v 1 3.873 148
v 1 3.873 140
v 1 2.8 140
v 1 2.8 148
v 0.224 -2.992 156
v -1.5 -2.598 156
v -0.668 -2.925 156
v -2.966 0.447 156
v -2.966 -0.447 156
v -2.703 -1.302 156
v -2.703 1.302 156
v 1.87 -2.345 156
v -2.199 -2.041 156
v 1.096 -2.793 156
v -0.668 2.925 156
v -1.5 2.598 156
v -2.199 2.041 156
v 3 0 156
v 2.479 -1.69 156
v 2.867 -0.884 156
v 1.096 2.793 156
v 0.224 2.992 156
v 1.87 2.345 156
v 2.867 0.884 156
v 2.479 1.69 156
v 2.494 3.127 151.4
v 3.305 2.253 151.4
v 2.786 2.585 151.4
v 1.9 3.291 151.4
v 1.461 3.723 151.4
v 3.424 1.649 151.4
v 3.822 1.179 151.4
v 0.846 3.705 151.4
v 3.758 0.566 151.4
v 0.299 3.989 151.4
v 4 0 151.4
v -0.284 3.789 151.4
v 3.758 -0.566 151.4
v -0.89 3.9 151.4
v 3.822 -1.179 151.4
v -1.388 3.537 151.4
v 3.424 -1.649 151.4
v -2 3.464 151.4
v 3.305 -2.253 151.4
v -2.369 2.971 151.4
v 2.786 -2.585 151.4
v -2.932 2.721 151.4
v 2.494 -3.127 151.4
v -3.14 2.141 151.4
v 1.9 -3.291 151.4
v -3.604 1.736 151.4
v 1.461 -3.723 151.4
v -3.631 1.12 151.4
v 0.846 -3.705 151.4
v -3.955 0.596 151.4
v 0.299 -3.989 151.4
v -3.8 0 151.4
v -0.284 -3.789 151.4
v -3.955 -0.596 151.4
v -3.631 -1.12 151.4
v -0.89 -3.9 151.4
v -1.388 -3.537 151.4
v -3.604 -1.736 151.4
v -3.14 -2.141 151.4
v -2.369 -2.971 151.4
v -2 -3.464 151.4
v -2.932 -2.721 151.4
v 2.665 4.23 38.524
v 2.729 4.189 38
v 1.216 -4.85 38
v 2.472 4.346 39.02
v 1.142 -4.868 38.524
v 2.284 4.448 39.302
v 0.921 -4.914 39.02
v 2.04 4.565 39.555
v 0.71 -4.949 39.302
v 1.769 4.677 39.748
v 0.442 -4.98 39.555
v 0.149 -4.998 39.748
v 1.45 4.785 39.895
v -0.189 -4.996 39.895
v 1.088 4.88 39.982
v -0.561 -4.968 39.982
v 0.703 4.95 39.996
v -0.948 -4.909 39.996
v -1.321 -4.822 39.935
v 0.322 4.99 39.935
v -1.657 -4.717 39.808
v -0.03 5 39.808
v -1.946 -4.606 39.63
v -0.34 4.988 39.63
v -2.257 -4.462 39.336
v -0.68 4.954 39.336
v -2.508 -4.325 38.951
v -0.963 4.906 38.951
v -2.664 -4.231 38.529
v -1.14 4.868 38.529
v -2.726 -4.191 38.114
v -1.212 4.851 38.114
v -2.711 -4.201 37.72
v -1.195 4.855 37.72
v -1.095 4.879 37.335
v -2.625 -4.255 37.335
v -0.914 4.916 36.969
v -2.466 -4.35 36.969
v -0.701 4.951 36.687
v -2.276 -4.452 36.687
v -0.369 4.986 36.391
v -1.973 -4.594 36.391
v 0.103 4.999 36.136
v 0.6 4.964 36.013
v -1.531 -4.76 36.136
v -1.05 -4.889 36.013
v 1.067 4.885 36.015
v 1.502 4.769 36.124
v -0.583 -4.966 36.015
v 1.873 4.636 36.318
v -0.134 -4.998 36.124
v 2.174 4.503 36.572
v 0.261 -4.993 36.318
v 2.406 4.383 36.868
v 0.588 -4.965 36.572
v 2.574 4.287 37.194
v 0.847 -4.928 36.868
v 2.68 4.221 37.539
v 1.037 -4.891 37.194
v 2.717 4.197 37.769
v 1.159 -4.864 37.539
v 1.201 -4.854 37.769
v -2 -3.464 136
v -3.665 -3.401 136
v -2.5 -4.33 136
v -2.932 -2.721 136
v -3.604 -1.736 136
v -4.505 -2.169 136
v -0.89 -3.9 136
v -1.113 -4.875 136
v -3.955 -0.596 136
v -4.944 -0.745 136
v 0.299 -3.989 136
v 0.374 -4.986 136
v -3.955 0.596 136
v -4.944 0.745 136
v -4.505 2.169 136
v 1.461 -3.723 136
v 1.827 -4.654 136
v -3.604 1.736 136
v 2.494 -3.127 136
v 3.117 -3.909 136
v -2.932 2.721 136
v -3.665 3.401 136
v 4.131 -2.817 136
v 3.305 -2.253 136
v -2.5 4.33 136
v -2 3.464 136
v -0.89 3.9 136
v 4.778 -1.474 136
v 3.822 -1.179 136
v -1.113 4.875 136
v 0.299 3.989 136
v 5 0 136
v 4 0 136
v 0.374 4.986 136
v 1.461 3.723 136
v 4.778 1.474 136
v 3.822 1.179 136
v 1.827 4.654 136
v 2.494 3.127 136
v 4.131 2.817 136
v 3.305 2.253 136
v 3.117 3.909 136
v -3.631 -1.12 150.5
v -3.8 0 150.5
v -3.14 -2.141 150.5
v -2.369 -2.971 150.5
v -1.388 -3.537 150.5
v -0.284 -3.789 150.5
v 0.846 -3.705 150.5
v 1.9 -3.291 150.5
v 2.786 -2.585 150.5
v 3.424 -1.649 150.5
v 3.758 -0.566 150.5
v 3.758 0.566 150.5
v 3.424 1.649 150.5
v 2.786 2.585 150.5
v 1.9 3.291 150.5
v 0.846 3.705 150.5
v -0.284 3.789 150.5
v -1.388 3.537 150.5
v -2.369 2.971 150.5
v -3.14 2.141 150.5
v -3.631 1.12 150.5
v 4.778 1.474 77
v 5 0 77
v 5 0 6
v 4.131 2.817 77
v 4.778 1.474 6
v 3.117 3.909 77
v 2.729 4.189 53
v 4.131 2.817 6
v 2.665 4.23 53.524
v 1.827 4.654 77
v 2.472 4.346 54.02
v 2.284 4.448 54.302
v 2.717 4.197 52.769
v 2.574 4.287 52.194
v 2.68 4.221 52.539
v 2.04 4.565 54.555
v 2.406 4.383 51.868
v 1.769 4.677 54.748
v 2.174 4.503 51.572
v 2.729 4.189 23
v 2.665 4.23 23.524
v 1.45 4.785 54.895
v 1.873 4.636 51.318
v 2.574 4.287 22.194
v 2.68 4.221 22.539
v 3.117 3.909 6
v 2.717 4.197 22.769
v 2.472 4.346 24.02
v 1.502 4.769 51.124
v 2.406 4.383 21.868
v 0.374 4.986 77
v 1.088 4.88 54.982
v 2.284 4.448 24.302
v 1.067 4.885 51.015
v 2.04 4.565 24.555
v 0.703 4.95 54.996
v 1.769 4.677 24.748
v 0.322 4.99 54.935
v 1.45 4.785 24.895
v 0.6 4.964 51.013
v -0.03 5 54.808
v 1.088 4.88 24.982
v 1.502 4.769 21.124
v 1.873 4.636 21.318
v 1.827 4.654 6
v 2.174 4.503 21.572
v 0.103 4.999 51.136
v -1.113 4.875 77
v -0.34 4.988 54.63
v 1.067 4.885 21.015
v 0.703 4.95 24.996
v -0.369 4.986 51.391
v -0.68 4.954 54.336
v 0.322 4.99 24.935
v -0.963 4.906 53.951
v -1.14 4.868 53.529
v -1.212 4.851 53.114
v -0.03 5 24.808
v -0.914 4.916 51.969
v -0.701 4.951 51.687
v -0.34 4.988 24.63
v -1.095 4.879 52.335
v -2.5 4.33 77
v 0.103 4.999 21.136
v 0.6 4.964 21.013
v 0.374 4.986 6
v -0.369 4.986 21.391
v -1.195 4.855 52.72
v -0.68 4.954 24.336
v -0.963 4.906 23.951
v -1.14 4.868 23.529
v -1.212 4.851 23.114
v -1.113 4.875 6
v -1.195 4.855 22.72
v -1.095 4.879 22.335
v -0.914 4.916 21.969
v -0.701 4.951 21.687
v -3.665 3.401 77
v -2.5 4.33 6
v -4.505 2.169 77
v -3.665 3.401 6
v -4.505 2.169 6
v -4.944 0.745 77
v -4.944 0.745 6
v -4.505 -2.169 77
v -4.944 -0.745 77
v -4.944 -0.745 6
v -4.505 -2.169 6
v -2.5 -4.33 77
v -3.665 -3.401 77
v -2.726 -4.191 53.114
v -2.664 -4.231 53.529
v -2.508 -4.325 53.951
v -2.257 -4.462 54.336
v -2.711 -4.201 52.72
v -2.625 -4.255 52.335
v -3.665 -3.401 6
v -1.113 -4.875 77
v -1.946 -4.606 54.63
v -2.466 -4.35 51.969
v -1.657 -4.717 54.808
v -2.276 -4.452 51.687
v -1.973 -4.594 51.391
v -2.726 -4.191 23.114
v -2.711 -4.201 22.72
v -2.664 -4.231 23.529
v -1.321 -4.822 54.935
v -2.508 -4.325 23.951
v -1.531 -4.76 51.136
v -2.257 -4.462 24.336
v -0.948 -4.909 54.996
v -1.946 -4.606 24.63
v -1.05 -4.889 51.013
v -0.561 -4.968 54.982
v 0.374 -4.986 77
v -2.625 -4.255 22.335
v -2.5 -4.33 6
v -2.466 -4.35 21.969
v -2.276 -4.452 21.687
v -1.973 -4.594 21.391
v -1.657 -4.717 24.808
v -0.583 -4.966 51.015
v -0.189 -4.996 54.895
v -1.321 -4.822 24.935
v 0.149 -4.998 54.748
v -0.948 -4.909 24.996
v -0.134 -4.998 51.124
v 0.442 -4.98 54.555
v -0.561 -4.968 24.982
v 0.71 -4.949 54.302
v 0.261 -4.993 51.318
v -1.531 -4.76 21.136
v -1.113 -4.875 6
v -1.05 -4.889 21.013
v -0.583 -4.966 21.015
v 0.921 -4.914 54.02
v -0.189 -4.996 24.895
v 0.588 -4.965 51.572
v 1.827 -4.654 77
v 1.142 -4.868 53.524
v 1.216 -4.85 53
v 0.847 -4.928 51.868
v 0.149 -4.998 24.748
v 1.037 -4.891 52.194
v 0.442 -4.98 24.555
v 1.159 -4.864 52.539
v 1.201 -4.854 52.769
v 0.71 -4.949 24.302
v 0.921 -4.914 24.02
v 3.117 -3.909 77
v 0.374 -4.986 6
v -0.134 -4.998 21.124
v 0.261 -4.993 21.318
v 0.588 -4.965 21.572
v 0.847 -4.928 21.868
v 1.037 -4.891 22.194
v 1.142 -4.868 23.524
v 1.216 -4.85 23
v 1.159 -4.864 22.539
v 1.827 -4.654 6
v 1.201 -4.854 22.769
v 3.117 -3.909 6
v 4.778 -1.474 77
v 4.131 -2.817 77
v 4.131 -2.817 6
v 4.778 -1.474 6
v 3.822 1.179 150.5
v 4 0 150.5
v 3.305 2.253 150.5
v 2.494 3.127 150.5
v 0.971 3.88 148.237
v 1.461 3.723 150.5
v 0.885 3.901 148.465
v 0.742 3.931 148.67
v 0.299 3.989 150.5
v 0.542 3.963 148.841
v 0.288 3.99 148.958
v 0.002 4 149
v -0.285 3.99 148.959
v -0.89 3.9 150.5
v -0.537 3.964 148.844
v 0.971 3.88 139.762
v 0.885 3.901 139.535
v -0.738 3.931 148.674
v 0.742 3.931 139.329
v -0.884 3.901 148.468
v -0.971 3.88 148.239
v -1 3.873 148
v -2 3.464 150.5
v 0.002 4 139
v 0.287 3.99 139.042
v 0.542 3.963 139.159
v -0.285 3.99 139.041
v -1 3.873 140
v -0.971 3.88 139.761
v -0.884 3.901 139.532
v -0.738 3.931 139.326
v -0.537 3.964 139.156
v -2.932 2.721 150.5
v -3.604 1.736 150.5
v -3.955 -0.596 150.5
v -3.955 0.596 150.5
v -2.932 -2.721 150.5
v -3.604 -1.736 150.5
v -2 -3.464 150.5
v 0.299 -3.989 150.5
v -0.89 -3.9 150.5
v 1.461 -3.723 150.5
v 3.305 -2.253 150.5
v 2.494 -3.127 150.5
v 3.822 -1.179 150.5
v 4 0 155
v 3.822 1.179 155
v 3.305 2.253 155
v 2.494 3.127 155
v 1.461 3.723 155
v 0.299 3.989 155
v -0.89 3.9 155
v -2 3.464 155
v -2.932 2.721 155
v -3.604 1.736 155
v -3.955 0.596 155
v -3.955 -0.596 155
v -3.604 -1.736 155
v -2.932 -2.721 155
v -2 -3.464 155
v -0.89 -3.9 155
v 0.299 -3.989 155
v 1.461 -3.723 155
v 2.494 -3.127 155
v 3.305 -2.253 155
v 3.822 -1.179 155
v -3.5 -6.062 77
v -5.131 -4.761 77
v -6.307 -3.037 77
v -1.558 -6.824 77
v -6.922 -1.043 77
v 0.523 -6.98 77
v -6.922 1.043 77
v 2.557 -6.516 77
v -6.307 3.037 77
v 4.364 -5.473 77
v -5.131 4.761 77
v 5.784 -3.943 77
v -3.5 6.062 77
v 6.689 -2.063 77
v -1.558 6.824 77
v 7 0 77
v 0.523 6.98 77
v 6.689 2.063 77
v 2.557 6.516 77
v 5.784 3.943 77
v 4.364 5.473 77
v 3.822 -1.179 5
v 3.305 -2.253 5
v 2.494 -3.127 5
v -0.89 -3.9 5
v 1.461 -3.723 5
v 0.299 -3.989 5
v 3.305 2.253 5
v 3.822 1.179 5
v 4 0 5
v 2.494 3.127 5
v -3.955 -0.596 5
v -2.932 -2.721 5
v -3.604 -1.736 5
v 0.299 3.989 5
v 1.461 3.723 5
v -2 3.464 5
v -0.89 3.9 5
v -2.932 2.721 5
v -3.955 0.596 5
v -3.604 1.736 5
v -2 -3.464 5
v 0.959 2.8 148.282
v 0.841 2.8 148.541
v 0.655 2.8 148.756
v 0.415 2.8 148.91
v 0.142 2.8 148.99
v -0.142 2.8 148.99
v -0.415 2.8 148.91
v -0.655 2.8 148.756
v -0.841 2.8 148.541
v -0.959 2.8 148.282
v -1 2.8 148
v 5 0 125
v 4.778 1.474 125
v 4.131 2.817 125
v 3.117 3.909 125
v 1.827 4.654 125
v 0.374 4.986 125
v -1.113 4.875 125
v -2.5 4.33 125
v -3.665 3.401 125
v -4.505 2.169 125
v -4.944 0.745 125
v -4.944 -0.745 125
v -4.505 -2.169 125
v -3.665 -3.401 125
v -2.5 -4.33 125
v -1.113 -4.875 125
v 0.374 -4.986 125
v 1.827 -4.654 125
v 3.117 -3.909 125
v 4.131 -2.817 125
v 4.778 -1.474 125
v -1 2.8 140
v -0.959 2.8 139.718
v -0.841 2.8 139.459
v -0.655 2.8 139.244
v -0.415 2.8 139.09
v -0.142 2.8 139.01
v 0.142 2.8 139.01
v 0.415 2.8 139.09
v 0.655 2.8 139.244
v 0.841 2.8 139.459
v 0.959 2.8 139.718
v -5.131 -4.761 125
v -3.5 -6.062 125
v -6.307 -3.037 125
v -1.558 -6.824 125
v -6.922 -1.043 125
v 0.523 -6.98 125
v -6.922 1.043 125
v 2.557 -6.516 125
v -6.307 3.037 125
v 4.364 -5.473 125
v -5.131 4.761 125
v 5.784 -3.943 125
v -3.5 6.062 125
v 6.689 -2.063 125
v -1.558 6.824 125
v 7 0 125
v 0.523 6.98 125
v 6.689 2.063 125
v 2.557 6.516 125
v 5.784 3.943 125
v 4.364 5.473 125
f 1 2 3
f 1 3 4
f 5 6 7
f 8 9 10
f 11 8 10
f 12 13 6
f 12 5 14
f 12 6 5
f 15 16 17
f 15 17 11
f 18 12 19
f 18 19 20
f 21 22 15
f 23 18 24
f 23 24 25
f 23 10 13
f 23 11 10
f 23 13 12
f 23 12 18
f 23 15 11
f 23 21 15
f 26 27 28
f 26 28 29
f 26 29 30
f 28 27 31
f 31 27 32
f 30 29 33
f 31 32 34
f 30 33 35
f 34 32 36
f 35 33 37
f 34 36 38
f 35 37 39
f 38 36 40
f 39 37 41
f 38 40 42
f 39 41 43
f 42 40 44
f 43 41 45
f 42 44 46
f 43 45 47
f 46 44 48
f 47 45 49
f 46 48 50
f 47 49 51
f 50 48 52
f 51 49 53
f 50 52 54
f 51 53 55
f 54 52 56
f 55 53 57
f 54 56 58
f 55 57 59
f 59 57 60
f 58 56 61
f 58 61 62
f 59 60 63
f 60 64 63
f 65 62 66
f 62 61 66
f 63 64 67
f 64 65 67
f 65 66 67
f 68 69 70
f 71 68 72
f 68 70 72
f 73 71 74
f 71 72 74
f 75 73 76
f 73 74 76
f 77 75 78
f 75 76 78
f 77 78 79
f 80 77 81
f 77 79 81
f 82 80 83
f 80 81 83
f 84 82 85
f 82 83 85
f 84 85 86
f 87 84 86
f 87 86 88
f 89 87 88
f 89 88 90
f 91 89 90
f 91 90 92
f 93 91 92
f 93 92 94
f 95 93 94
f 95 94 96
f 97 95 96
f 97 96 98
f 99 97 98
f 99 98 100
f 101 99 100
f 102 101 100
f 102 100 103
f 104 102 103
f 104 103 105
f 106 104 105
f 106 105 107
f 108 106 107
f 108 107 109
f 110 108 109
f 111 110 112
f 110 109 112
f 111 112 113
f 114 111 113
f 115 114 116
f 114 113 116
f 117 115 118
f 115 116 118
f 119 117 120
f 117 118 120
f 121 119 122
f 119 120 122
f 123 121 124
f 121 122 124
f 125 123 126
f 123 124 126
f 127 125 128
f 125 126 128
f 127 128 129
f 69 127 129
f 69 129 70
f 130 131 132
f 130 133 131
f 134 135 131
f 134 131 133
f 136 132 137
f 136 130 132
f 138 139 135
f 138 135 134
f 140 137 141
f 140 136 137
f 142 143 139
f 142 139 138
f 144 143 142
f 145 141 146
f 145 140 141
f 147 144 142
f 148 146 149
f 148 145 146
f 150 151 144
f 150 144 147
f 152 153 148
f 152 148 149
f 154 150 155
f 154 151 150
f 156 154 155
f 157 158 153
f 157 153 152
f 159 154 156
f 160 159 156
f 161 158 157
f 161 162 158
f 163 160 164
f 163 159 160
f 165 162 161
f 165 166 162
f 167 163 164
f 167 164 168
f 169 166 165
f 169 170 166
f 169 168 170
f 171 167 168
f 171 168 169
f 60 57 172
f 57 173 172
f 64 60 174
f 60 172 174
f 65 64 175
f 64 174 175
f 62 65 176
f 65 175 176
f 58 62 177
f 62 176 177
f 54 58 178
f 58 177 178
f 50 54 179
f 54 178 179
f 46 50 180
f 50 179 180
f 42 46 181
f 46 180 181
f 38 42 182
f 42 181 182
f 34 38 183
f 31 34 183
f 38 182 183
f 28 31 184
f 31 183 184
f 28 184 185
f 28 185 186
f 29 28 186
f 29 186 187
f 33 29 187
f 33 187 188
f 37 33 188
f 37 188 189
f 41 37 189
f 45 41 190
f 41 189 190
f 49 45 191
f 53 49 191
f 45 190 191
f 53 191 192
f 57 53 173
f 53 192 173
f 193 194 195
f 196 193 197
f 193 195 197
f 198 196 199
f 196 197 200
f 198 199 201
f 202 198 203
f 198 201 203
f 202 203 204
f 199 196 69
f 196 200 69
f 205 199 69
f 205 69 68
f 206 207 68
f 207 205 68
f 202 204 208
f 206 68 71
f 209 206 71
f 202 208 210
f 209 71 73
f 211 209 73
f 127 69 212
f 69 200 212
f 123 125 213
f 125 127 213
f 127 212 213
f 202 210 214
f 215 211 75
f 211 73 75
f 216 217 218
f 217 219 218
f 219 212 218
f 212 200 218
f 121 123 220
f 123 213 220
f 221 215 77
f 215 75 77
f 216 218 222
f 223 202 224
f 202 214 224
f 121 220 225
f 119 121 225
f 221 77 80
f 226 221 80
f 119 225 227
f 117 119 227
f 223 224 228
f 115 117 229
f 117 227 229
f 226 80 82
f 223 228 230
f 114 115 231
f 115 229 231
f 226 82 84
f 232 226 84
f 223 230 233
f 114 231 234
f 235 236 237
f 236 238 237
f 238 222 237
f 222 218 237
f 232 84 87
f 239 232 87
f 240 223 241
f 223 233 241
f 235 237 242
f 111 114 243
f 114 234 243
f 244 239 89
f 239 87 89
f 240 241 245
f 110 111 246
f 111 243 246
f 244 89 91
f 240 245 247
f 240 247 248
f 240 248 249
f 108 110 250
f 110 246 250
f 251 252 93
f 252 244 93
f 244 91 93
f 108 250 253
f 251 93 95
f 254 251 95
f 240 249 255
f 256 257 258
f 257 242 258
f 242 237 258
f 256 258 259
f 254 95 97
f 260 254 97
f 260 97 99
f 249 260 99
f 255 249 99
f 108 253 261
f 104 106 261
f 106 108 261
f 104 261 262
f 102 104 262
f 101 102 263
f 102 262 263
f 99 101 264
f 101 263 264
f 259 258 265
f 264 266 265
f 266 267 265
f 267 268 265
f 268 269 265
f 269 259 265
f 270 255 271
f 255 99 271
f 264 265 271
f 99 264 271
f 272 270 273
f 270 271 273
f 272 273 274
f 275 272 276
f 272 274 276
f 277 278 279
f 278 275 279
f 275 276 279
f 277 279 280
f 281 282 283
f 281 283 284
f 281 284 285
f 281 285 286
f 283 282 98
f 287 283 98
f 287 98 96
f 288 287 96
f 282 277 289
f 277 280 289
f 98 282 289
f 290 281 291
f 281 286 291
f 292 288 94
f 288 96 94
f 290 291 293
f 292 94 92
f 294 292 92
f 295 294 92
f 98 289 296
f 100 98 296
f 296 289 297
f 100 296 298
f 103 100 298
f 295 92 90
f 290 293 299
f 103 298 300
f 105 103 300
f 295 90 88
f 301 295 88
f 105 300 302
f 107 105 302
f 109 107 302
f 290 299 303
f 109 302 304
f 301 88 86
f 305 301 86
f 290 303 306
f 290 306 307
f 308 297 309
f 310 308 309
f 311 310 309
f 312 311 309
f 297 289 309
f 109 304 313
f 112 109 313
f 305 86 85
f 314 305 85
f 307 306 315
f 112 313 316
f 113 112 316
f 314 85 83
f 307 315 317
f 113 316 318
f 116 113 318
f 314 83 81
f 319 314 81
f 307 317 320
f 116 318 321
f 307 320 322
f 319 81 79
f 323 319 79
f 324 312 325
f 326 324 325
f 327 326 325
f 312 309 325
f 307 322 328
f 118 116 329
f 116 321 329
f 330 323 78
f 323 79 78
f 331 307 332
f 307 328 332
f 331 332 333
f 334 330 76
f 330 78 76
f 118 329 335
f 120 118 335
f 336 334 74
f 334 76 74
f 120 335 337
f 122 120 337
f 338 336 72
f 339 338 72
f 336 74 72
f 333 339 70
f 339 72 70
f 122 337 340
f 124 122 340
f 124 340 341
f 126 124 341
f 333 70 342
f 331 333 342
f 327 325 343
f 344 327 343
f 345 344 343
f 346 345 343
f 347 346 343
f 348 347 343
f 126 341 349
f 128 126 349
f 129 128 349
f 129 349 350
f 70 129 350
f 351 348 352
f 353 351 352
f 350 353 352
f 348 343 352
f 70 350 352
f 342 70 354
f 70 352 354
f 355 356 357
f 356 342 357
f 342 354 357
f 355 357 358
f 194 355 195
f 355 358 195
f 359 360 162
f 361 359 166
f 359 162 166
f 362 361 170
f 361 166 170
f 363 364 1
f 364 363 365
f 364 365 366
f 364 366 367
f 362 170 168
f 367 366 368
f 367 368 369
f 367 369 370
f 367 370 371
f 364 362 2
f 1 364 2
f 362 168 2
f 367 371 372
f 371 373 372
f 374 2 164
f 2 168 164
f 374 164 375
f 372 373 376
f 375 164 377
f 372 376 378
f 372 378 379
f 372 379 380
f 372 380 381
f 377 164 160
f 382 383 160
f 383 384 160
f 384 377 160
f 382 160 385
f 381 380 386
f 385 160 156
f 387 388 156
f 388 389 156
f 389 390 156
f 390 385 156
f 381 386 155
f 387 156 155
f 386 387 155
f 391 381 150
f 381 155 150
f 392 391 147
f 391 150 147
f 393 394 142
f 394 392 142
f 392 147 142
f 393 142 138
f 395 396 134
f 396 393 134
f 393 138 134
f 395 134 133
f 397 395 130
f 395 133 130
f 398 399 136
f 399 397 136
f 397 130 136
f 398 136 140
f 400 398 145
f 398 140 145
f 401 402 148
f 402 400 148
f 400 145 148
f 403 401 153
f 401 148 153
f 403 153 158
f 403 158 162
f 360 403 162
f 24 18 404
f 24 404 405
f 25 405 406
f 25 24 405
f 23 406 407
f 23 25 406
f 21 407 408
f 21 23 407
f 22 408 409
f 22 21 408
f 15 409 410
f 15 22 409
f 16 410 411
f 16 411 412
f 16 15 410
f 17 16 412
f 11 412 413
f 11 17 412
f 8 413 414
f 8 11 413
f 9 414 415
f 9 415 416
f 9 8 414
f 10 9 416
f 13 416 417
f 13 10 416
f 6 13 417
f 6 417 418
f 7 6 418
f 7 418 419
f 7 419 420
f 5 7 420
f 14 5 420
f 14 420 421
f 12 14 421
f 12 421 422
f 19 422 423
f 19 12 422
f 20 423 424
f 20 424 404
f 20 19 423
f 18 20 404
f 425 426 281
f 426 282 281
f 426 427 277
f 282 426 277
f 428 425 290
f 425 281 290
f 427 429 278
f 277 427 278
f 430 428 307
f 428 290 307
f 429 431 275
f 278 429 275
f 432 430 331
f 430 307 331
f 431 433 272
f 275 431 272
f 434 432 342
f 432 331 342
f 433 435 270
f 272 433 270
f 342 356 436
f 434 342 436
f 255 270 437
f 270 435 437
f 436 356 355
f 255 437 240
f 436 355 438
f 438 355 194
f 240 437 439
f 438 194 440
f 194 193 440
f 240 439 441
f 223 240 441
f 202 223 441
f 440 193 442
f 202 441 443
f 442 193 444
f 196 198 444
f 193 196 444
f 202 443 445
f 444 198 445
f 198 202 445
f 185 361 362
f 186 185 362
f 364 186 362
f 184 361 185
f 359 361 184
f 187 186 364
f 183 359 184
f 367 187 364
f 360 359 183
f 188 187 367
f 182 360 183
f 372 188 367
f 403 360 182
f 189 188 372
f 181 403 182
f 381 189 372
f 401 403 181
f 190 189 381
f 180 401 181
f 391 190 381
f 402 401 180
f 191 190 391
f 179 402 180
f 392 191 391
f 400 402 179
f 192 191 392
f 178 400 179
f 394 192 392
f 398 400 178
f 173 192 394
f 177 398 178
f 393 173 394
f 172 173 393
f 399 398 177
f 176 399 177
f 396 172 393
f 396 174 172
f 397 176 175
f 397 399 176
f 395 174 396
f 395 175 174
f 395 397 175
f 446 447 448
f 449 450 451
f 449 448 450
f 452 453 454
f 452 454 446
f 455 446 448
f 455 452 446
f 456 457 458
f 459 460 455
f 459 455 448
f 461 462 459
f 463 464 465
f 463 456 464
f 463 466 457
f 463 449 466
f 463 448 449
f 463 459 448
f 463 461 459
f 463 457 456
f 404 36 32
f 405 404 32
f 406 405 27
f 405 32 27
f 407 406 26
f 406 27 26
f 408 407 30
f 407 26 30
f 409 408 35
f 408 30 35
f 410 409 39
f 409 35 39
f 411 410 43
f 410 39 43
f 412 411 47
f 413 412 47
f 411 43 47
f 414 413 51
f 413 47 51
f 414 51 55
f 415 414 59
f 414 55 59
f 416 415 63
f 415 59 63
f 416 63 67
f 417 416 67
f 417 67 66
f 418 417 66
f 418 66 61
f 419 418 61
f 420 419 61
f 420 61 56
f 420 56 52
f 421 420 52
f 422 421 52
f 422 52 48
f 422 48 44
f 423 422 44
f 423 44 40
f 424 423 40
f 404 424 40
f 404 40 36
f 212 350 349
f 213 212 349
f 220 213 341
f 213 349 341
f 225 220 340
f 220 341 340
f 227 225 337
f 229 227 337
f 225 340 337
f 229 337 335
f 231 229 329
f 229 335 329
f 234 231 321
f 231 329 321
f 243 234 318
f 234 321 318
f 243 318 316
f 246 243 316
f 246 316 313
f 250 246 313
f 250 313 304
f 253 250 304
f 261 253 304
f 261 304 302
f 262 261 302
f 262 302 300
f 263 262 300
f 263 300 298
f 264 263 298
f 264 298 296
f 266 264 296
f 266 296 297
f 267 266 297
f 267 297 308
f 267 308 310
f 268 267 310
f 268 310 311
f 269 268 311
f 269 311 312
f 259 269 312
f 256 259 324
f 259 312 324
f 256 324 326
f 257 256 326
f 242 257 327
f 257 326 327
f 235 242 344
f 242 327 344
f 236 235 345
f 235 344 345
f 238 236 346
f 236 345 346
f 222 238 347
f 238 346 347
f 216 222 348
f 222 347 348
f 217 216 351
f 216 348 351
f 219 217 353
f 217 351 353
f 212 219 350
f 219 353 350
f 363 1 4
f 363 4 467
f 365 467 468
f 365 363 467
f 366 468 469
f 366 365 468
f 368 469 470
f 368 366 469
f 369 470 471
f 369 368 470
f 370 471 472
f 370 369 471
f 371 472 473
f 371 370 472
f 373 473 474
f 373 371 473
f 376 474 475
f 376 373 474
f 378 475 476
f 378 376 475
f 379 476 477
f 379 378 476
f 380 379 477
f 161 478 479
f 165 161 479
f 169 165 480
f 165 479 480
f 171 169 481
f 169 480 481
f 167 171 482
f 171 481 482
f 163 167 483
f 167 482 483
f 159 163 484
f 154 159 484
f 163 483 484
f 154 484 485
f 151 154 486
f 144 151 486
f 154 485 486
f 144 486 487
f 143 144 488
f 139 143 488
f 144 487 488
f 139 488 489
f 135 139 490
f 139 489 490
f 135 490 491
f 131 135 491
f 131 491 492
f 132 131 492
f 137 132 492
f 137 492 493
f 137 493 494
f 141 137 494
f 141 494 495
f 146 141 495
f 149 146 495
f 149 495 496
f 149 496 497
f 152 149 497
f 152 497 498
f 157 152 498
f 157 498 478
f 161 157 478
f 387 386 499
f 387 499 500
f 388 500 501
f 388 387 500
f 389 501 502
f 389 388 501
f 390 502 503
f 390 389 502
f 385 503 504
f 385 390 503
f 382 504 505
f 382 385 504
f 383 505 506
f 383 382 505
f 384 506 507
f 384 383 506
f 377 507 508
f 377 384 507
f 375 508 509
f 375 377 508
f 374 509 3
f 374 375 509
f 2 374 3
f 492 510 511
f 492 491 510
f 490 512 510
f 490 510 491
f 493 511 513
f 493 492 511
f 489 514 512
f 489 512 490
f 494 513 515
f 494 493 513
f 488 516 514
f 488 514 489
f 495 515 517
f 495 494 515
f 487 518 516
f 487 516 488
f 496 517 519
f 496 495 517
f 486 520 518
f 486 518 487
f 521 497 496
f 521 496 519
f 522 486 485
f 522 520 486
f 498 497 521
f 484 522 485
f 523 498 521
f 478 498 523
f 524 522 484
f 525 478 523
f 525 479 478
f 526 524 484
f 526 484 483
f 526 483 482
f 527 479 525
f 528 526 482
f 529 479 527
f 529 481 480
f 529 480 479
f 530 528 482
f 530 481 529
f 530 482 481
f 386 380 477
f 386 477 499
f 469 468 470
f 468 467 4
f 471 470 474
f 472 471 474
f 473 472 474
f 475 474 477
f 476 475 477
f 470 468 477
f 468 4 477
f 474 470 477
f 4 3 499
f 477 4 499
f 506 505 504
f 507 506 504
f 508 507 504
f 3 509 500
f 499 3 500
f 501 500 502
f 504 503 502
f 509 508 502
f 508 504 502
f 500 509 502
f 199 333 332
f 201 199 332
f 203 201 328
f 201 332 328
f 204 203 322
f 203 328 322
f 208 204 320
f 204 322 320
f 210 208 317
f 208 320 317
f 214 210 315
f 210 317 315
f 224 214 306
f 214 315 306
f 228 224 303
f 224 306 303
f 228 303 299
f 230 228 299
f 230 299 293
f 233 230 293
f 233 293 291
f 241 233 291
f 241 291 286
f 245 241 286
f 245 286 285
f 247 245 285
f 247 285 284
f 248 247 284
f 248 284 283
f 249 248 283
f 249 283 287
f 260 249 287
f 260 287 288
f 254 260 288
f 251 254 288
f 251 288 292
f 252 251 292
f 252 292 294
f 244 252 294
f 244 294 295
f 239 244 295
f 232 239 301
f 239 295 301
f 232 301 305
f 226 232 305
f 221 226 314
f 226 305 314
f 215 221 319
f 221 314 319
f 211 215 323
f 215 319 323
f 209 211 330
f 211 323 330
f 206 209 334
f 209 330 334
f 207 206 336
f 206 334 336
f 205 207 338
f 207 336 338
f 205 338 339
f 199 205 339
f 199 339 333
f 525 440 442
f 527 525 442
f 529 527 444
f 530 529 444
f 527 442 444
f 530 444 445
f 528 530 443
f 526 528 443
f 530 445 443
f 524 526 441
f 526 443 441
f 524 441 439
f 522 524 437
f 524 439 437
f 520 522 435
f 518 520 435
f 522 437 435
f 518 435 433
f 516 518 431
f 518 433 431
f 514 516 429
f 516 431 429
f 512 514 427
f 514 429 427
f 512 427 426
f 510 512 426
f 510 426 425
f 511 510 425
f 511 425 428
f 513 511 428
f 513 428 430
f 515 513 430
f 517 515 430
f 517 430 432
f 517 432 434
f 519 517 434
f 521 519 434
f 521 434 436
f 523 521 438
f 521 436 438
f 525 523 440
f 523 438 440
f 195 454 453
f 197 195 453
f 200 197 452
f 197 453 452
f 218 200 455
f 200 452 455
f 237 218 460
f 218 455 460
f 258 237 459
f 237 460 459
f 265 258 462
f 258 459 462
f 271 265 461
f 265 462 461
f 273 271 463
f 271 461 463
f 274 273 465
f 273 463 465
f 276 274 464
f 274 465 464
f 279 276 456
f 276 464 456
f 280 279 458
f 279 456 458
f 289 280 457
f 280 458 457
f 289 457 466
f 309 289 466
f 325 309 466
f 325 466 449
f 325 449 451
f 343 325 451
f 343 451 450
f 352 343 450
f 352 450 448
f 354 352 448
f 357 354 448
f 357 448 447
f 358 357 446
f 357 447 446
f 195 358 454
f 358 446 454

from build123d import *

# Parameters (mm, degrees)
SKETCH1_R           = 5
BOSS_EXTRUDE1_DEPTH = 136
SKETCH2_R           = 4
BOSS_EXTRUDE2_DEPTH = 20
CUT_EXTRUDE1_DEPTH  = 1.2
SKETCH4_W           = 0.55765723
SKETCH4_H           = 0.9
CHAMFER1_SIZE       = 1
SKETCH6_R           = 7
BOSS_EXTRUDE3_DEPTH = 48
CUT_EXTRUDE3_REACH  = 159.949
SKETCH7_R           = 2
SKETCH8_R           = 5
CUT_EXTRUDE4_DEPTH  = 5
CHAMFER2_SIZE       = 1


with BuildPart() as part:
    # Sketch1 → Boss-Extrude1 (new body)
    with BuildSketch(Plane.XY):
        Circle(SKETCH1_R)
    extrude(amount=BOSS_EXTRUDE1_DEPTH)

    # Sketch2 → Boss-Extrude2 (add)
    with BuildSketch(Plane.XY.offset(136)):
        Circle(SKETCH2_R)
    extrude(amount=BOSS_EXTRUDE2_DEPTH)

    # Sketch3 → Cut-Extrude1 (cut)
    with BuildSketch(Plane(origin=(0, 4, 0), x_dir=(1, 0, 0), z_dir=(0, 1, 0))):
        with BuildLine():
            Line((-1, -148), (-1, -140))
            ThreePointArc((-1, -140), (0, -139), (1, -140))
            Line((1, -140), (1, -148))
            ThreePointArc((1, -148), (0, -149), (-1, -148))
        make_face()
    extrude(amount=-CUT_EXTRUDE1_DEPTH, mode=Mode.SUBTRACT)

    # Sketch4 → Cut-Revolve1 (revolve, cut)
    with BuildSketch(Plane(origin=(0, 0, 0), x_dir=(1, 0, 0), z_dir=(0, 1, 0))):
        with Locations((-4.078828615, -150.95)):
            Rectangle(SKETCH4_W, SKETCH4_H)
    revolve(axis=Axis((0, 0, -16.531983683), (0, 0, 1)), mode=Mode.SUBTRACT)

    # Chamfer1
    chamfer1_edges = [part.edges().sort_by_distance(p)[0] for p in [
        (-4, 0, 156),
    ]]
    chamfer(chamfer1_edges, length=CHAMFER1_SIZE)

    # Sketch6 → Boss-Extrude3 (add)
    with BuildSketch(Plane.XY.offset(77)):
        Circle(SKETCH6_R)
    extrude(amount=BOSS_EXTRUDE3_DEPTH)

    # Sketch7 → Cut-Extrude3 (cut, up to next)
    with BuildSketch(Plane(origin=(-2.642522108, -15.780274931, 0), x_dir=(0, 0, 1), z_dir=(-0.16515763172219566, -0.9862671832135123, -1.0705486064346984e-15)), mode=Mode.PRIVATE) as cut_extrude3_sk1:
        with Locations((53, 0)):
            Circle(SKETCH7_R)
    cut_extrude3_tool1 = extrude(cut_extrude3_sk1.sketch, amount=-CUT_EXTRUDE3_REACH, mode=Mode.PRIVATE) & part.part
    # Sketch7 → Cut-Extrude3 (cut, up to next)
    with BuildSketch(Plane(origin=(-2.642522108, -15.780274931, 0), x_dir=(0, 0, 1), z_dir=(-0.16515763172219566, -0.9862671832135123, -1.0705486064346984e-15)), mode=Mode.PRIVATE) as cut_extrude3_sk2:
        with Locations((38, 0)):
            Circle(SKETCH7_R)
    cut_extrude3_tool2 = extrude(cut_extrude3_sk2.sketch, amount=-CUT_EXTRUDE3_REACH, mode=Mode.PRIVATE) & part.part
    # Sketch7 → Cut-Extrude3 (cut, up to next)
    with BuildSketch(Plane(origin=(-2.642522108, -15.780274931, 0), x_dir=(0, 0, 1), z_dir=(-0.16515763172219566, -0.9862671832135123, -1.0705486064346984e-15)), mode=Mode.PRIVATE) as cut_extrude3_sk3:
        with Locations((23, 0)):
            Circle(SKETCH7_R)
    cut_extrude3_tool3 = extrude(cut_extrude3_sk3.sketch, amount=-CUT_EXTRUDE3_REACH, mode=Mode.PRIVATE) & part.part
    add(cut_extrude3_tool1.solids().sort_by_distance((-2.642522, -15.780275, 53))[0], mode=Mode.SUBTRACT)
    add(cut_extrude3_tool2.solids().sort_by_distance((-2.642522, -15.780275, 38))[0], mode=Mode.SUBTRACT)
    add(cut_extrude3_tool3.solids().sort_by_distance((-2.642522, -15.780275, 23))[0], mode=Mode.SUBTRACT)

    # Sketch8 → Cut-Extrude4 (cut)
    with BuildSketch(Plane(origin=(0, 0, 0), x_dir=(-1, 0, 0), z_dir=(0, 0, -1))):
        Circle(SKETCH8_R)
    extrude(amount=-CUT_EXTRUDE4_DEPTH, mode=Mode.SUBTRACT)

    # Chamfer2
    chamfer2_edges = [part.edges().sort_by_distance(p)[0] for p in [
        (-5, 0, 5),
    ]]
    chamfer(chamfer2_edges, length=CHAMFER2_SIZE)


solid = part.part
